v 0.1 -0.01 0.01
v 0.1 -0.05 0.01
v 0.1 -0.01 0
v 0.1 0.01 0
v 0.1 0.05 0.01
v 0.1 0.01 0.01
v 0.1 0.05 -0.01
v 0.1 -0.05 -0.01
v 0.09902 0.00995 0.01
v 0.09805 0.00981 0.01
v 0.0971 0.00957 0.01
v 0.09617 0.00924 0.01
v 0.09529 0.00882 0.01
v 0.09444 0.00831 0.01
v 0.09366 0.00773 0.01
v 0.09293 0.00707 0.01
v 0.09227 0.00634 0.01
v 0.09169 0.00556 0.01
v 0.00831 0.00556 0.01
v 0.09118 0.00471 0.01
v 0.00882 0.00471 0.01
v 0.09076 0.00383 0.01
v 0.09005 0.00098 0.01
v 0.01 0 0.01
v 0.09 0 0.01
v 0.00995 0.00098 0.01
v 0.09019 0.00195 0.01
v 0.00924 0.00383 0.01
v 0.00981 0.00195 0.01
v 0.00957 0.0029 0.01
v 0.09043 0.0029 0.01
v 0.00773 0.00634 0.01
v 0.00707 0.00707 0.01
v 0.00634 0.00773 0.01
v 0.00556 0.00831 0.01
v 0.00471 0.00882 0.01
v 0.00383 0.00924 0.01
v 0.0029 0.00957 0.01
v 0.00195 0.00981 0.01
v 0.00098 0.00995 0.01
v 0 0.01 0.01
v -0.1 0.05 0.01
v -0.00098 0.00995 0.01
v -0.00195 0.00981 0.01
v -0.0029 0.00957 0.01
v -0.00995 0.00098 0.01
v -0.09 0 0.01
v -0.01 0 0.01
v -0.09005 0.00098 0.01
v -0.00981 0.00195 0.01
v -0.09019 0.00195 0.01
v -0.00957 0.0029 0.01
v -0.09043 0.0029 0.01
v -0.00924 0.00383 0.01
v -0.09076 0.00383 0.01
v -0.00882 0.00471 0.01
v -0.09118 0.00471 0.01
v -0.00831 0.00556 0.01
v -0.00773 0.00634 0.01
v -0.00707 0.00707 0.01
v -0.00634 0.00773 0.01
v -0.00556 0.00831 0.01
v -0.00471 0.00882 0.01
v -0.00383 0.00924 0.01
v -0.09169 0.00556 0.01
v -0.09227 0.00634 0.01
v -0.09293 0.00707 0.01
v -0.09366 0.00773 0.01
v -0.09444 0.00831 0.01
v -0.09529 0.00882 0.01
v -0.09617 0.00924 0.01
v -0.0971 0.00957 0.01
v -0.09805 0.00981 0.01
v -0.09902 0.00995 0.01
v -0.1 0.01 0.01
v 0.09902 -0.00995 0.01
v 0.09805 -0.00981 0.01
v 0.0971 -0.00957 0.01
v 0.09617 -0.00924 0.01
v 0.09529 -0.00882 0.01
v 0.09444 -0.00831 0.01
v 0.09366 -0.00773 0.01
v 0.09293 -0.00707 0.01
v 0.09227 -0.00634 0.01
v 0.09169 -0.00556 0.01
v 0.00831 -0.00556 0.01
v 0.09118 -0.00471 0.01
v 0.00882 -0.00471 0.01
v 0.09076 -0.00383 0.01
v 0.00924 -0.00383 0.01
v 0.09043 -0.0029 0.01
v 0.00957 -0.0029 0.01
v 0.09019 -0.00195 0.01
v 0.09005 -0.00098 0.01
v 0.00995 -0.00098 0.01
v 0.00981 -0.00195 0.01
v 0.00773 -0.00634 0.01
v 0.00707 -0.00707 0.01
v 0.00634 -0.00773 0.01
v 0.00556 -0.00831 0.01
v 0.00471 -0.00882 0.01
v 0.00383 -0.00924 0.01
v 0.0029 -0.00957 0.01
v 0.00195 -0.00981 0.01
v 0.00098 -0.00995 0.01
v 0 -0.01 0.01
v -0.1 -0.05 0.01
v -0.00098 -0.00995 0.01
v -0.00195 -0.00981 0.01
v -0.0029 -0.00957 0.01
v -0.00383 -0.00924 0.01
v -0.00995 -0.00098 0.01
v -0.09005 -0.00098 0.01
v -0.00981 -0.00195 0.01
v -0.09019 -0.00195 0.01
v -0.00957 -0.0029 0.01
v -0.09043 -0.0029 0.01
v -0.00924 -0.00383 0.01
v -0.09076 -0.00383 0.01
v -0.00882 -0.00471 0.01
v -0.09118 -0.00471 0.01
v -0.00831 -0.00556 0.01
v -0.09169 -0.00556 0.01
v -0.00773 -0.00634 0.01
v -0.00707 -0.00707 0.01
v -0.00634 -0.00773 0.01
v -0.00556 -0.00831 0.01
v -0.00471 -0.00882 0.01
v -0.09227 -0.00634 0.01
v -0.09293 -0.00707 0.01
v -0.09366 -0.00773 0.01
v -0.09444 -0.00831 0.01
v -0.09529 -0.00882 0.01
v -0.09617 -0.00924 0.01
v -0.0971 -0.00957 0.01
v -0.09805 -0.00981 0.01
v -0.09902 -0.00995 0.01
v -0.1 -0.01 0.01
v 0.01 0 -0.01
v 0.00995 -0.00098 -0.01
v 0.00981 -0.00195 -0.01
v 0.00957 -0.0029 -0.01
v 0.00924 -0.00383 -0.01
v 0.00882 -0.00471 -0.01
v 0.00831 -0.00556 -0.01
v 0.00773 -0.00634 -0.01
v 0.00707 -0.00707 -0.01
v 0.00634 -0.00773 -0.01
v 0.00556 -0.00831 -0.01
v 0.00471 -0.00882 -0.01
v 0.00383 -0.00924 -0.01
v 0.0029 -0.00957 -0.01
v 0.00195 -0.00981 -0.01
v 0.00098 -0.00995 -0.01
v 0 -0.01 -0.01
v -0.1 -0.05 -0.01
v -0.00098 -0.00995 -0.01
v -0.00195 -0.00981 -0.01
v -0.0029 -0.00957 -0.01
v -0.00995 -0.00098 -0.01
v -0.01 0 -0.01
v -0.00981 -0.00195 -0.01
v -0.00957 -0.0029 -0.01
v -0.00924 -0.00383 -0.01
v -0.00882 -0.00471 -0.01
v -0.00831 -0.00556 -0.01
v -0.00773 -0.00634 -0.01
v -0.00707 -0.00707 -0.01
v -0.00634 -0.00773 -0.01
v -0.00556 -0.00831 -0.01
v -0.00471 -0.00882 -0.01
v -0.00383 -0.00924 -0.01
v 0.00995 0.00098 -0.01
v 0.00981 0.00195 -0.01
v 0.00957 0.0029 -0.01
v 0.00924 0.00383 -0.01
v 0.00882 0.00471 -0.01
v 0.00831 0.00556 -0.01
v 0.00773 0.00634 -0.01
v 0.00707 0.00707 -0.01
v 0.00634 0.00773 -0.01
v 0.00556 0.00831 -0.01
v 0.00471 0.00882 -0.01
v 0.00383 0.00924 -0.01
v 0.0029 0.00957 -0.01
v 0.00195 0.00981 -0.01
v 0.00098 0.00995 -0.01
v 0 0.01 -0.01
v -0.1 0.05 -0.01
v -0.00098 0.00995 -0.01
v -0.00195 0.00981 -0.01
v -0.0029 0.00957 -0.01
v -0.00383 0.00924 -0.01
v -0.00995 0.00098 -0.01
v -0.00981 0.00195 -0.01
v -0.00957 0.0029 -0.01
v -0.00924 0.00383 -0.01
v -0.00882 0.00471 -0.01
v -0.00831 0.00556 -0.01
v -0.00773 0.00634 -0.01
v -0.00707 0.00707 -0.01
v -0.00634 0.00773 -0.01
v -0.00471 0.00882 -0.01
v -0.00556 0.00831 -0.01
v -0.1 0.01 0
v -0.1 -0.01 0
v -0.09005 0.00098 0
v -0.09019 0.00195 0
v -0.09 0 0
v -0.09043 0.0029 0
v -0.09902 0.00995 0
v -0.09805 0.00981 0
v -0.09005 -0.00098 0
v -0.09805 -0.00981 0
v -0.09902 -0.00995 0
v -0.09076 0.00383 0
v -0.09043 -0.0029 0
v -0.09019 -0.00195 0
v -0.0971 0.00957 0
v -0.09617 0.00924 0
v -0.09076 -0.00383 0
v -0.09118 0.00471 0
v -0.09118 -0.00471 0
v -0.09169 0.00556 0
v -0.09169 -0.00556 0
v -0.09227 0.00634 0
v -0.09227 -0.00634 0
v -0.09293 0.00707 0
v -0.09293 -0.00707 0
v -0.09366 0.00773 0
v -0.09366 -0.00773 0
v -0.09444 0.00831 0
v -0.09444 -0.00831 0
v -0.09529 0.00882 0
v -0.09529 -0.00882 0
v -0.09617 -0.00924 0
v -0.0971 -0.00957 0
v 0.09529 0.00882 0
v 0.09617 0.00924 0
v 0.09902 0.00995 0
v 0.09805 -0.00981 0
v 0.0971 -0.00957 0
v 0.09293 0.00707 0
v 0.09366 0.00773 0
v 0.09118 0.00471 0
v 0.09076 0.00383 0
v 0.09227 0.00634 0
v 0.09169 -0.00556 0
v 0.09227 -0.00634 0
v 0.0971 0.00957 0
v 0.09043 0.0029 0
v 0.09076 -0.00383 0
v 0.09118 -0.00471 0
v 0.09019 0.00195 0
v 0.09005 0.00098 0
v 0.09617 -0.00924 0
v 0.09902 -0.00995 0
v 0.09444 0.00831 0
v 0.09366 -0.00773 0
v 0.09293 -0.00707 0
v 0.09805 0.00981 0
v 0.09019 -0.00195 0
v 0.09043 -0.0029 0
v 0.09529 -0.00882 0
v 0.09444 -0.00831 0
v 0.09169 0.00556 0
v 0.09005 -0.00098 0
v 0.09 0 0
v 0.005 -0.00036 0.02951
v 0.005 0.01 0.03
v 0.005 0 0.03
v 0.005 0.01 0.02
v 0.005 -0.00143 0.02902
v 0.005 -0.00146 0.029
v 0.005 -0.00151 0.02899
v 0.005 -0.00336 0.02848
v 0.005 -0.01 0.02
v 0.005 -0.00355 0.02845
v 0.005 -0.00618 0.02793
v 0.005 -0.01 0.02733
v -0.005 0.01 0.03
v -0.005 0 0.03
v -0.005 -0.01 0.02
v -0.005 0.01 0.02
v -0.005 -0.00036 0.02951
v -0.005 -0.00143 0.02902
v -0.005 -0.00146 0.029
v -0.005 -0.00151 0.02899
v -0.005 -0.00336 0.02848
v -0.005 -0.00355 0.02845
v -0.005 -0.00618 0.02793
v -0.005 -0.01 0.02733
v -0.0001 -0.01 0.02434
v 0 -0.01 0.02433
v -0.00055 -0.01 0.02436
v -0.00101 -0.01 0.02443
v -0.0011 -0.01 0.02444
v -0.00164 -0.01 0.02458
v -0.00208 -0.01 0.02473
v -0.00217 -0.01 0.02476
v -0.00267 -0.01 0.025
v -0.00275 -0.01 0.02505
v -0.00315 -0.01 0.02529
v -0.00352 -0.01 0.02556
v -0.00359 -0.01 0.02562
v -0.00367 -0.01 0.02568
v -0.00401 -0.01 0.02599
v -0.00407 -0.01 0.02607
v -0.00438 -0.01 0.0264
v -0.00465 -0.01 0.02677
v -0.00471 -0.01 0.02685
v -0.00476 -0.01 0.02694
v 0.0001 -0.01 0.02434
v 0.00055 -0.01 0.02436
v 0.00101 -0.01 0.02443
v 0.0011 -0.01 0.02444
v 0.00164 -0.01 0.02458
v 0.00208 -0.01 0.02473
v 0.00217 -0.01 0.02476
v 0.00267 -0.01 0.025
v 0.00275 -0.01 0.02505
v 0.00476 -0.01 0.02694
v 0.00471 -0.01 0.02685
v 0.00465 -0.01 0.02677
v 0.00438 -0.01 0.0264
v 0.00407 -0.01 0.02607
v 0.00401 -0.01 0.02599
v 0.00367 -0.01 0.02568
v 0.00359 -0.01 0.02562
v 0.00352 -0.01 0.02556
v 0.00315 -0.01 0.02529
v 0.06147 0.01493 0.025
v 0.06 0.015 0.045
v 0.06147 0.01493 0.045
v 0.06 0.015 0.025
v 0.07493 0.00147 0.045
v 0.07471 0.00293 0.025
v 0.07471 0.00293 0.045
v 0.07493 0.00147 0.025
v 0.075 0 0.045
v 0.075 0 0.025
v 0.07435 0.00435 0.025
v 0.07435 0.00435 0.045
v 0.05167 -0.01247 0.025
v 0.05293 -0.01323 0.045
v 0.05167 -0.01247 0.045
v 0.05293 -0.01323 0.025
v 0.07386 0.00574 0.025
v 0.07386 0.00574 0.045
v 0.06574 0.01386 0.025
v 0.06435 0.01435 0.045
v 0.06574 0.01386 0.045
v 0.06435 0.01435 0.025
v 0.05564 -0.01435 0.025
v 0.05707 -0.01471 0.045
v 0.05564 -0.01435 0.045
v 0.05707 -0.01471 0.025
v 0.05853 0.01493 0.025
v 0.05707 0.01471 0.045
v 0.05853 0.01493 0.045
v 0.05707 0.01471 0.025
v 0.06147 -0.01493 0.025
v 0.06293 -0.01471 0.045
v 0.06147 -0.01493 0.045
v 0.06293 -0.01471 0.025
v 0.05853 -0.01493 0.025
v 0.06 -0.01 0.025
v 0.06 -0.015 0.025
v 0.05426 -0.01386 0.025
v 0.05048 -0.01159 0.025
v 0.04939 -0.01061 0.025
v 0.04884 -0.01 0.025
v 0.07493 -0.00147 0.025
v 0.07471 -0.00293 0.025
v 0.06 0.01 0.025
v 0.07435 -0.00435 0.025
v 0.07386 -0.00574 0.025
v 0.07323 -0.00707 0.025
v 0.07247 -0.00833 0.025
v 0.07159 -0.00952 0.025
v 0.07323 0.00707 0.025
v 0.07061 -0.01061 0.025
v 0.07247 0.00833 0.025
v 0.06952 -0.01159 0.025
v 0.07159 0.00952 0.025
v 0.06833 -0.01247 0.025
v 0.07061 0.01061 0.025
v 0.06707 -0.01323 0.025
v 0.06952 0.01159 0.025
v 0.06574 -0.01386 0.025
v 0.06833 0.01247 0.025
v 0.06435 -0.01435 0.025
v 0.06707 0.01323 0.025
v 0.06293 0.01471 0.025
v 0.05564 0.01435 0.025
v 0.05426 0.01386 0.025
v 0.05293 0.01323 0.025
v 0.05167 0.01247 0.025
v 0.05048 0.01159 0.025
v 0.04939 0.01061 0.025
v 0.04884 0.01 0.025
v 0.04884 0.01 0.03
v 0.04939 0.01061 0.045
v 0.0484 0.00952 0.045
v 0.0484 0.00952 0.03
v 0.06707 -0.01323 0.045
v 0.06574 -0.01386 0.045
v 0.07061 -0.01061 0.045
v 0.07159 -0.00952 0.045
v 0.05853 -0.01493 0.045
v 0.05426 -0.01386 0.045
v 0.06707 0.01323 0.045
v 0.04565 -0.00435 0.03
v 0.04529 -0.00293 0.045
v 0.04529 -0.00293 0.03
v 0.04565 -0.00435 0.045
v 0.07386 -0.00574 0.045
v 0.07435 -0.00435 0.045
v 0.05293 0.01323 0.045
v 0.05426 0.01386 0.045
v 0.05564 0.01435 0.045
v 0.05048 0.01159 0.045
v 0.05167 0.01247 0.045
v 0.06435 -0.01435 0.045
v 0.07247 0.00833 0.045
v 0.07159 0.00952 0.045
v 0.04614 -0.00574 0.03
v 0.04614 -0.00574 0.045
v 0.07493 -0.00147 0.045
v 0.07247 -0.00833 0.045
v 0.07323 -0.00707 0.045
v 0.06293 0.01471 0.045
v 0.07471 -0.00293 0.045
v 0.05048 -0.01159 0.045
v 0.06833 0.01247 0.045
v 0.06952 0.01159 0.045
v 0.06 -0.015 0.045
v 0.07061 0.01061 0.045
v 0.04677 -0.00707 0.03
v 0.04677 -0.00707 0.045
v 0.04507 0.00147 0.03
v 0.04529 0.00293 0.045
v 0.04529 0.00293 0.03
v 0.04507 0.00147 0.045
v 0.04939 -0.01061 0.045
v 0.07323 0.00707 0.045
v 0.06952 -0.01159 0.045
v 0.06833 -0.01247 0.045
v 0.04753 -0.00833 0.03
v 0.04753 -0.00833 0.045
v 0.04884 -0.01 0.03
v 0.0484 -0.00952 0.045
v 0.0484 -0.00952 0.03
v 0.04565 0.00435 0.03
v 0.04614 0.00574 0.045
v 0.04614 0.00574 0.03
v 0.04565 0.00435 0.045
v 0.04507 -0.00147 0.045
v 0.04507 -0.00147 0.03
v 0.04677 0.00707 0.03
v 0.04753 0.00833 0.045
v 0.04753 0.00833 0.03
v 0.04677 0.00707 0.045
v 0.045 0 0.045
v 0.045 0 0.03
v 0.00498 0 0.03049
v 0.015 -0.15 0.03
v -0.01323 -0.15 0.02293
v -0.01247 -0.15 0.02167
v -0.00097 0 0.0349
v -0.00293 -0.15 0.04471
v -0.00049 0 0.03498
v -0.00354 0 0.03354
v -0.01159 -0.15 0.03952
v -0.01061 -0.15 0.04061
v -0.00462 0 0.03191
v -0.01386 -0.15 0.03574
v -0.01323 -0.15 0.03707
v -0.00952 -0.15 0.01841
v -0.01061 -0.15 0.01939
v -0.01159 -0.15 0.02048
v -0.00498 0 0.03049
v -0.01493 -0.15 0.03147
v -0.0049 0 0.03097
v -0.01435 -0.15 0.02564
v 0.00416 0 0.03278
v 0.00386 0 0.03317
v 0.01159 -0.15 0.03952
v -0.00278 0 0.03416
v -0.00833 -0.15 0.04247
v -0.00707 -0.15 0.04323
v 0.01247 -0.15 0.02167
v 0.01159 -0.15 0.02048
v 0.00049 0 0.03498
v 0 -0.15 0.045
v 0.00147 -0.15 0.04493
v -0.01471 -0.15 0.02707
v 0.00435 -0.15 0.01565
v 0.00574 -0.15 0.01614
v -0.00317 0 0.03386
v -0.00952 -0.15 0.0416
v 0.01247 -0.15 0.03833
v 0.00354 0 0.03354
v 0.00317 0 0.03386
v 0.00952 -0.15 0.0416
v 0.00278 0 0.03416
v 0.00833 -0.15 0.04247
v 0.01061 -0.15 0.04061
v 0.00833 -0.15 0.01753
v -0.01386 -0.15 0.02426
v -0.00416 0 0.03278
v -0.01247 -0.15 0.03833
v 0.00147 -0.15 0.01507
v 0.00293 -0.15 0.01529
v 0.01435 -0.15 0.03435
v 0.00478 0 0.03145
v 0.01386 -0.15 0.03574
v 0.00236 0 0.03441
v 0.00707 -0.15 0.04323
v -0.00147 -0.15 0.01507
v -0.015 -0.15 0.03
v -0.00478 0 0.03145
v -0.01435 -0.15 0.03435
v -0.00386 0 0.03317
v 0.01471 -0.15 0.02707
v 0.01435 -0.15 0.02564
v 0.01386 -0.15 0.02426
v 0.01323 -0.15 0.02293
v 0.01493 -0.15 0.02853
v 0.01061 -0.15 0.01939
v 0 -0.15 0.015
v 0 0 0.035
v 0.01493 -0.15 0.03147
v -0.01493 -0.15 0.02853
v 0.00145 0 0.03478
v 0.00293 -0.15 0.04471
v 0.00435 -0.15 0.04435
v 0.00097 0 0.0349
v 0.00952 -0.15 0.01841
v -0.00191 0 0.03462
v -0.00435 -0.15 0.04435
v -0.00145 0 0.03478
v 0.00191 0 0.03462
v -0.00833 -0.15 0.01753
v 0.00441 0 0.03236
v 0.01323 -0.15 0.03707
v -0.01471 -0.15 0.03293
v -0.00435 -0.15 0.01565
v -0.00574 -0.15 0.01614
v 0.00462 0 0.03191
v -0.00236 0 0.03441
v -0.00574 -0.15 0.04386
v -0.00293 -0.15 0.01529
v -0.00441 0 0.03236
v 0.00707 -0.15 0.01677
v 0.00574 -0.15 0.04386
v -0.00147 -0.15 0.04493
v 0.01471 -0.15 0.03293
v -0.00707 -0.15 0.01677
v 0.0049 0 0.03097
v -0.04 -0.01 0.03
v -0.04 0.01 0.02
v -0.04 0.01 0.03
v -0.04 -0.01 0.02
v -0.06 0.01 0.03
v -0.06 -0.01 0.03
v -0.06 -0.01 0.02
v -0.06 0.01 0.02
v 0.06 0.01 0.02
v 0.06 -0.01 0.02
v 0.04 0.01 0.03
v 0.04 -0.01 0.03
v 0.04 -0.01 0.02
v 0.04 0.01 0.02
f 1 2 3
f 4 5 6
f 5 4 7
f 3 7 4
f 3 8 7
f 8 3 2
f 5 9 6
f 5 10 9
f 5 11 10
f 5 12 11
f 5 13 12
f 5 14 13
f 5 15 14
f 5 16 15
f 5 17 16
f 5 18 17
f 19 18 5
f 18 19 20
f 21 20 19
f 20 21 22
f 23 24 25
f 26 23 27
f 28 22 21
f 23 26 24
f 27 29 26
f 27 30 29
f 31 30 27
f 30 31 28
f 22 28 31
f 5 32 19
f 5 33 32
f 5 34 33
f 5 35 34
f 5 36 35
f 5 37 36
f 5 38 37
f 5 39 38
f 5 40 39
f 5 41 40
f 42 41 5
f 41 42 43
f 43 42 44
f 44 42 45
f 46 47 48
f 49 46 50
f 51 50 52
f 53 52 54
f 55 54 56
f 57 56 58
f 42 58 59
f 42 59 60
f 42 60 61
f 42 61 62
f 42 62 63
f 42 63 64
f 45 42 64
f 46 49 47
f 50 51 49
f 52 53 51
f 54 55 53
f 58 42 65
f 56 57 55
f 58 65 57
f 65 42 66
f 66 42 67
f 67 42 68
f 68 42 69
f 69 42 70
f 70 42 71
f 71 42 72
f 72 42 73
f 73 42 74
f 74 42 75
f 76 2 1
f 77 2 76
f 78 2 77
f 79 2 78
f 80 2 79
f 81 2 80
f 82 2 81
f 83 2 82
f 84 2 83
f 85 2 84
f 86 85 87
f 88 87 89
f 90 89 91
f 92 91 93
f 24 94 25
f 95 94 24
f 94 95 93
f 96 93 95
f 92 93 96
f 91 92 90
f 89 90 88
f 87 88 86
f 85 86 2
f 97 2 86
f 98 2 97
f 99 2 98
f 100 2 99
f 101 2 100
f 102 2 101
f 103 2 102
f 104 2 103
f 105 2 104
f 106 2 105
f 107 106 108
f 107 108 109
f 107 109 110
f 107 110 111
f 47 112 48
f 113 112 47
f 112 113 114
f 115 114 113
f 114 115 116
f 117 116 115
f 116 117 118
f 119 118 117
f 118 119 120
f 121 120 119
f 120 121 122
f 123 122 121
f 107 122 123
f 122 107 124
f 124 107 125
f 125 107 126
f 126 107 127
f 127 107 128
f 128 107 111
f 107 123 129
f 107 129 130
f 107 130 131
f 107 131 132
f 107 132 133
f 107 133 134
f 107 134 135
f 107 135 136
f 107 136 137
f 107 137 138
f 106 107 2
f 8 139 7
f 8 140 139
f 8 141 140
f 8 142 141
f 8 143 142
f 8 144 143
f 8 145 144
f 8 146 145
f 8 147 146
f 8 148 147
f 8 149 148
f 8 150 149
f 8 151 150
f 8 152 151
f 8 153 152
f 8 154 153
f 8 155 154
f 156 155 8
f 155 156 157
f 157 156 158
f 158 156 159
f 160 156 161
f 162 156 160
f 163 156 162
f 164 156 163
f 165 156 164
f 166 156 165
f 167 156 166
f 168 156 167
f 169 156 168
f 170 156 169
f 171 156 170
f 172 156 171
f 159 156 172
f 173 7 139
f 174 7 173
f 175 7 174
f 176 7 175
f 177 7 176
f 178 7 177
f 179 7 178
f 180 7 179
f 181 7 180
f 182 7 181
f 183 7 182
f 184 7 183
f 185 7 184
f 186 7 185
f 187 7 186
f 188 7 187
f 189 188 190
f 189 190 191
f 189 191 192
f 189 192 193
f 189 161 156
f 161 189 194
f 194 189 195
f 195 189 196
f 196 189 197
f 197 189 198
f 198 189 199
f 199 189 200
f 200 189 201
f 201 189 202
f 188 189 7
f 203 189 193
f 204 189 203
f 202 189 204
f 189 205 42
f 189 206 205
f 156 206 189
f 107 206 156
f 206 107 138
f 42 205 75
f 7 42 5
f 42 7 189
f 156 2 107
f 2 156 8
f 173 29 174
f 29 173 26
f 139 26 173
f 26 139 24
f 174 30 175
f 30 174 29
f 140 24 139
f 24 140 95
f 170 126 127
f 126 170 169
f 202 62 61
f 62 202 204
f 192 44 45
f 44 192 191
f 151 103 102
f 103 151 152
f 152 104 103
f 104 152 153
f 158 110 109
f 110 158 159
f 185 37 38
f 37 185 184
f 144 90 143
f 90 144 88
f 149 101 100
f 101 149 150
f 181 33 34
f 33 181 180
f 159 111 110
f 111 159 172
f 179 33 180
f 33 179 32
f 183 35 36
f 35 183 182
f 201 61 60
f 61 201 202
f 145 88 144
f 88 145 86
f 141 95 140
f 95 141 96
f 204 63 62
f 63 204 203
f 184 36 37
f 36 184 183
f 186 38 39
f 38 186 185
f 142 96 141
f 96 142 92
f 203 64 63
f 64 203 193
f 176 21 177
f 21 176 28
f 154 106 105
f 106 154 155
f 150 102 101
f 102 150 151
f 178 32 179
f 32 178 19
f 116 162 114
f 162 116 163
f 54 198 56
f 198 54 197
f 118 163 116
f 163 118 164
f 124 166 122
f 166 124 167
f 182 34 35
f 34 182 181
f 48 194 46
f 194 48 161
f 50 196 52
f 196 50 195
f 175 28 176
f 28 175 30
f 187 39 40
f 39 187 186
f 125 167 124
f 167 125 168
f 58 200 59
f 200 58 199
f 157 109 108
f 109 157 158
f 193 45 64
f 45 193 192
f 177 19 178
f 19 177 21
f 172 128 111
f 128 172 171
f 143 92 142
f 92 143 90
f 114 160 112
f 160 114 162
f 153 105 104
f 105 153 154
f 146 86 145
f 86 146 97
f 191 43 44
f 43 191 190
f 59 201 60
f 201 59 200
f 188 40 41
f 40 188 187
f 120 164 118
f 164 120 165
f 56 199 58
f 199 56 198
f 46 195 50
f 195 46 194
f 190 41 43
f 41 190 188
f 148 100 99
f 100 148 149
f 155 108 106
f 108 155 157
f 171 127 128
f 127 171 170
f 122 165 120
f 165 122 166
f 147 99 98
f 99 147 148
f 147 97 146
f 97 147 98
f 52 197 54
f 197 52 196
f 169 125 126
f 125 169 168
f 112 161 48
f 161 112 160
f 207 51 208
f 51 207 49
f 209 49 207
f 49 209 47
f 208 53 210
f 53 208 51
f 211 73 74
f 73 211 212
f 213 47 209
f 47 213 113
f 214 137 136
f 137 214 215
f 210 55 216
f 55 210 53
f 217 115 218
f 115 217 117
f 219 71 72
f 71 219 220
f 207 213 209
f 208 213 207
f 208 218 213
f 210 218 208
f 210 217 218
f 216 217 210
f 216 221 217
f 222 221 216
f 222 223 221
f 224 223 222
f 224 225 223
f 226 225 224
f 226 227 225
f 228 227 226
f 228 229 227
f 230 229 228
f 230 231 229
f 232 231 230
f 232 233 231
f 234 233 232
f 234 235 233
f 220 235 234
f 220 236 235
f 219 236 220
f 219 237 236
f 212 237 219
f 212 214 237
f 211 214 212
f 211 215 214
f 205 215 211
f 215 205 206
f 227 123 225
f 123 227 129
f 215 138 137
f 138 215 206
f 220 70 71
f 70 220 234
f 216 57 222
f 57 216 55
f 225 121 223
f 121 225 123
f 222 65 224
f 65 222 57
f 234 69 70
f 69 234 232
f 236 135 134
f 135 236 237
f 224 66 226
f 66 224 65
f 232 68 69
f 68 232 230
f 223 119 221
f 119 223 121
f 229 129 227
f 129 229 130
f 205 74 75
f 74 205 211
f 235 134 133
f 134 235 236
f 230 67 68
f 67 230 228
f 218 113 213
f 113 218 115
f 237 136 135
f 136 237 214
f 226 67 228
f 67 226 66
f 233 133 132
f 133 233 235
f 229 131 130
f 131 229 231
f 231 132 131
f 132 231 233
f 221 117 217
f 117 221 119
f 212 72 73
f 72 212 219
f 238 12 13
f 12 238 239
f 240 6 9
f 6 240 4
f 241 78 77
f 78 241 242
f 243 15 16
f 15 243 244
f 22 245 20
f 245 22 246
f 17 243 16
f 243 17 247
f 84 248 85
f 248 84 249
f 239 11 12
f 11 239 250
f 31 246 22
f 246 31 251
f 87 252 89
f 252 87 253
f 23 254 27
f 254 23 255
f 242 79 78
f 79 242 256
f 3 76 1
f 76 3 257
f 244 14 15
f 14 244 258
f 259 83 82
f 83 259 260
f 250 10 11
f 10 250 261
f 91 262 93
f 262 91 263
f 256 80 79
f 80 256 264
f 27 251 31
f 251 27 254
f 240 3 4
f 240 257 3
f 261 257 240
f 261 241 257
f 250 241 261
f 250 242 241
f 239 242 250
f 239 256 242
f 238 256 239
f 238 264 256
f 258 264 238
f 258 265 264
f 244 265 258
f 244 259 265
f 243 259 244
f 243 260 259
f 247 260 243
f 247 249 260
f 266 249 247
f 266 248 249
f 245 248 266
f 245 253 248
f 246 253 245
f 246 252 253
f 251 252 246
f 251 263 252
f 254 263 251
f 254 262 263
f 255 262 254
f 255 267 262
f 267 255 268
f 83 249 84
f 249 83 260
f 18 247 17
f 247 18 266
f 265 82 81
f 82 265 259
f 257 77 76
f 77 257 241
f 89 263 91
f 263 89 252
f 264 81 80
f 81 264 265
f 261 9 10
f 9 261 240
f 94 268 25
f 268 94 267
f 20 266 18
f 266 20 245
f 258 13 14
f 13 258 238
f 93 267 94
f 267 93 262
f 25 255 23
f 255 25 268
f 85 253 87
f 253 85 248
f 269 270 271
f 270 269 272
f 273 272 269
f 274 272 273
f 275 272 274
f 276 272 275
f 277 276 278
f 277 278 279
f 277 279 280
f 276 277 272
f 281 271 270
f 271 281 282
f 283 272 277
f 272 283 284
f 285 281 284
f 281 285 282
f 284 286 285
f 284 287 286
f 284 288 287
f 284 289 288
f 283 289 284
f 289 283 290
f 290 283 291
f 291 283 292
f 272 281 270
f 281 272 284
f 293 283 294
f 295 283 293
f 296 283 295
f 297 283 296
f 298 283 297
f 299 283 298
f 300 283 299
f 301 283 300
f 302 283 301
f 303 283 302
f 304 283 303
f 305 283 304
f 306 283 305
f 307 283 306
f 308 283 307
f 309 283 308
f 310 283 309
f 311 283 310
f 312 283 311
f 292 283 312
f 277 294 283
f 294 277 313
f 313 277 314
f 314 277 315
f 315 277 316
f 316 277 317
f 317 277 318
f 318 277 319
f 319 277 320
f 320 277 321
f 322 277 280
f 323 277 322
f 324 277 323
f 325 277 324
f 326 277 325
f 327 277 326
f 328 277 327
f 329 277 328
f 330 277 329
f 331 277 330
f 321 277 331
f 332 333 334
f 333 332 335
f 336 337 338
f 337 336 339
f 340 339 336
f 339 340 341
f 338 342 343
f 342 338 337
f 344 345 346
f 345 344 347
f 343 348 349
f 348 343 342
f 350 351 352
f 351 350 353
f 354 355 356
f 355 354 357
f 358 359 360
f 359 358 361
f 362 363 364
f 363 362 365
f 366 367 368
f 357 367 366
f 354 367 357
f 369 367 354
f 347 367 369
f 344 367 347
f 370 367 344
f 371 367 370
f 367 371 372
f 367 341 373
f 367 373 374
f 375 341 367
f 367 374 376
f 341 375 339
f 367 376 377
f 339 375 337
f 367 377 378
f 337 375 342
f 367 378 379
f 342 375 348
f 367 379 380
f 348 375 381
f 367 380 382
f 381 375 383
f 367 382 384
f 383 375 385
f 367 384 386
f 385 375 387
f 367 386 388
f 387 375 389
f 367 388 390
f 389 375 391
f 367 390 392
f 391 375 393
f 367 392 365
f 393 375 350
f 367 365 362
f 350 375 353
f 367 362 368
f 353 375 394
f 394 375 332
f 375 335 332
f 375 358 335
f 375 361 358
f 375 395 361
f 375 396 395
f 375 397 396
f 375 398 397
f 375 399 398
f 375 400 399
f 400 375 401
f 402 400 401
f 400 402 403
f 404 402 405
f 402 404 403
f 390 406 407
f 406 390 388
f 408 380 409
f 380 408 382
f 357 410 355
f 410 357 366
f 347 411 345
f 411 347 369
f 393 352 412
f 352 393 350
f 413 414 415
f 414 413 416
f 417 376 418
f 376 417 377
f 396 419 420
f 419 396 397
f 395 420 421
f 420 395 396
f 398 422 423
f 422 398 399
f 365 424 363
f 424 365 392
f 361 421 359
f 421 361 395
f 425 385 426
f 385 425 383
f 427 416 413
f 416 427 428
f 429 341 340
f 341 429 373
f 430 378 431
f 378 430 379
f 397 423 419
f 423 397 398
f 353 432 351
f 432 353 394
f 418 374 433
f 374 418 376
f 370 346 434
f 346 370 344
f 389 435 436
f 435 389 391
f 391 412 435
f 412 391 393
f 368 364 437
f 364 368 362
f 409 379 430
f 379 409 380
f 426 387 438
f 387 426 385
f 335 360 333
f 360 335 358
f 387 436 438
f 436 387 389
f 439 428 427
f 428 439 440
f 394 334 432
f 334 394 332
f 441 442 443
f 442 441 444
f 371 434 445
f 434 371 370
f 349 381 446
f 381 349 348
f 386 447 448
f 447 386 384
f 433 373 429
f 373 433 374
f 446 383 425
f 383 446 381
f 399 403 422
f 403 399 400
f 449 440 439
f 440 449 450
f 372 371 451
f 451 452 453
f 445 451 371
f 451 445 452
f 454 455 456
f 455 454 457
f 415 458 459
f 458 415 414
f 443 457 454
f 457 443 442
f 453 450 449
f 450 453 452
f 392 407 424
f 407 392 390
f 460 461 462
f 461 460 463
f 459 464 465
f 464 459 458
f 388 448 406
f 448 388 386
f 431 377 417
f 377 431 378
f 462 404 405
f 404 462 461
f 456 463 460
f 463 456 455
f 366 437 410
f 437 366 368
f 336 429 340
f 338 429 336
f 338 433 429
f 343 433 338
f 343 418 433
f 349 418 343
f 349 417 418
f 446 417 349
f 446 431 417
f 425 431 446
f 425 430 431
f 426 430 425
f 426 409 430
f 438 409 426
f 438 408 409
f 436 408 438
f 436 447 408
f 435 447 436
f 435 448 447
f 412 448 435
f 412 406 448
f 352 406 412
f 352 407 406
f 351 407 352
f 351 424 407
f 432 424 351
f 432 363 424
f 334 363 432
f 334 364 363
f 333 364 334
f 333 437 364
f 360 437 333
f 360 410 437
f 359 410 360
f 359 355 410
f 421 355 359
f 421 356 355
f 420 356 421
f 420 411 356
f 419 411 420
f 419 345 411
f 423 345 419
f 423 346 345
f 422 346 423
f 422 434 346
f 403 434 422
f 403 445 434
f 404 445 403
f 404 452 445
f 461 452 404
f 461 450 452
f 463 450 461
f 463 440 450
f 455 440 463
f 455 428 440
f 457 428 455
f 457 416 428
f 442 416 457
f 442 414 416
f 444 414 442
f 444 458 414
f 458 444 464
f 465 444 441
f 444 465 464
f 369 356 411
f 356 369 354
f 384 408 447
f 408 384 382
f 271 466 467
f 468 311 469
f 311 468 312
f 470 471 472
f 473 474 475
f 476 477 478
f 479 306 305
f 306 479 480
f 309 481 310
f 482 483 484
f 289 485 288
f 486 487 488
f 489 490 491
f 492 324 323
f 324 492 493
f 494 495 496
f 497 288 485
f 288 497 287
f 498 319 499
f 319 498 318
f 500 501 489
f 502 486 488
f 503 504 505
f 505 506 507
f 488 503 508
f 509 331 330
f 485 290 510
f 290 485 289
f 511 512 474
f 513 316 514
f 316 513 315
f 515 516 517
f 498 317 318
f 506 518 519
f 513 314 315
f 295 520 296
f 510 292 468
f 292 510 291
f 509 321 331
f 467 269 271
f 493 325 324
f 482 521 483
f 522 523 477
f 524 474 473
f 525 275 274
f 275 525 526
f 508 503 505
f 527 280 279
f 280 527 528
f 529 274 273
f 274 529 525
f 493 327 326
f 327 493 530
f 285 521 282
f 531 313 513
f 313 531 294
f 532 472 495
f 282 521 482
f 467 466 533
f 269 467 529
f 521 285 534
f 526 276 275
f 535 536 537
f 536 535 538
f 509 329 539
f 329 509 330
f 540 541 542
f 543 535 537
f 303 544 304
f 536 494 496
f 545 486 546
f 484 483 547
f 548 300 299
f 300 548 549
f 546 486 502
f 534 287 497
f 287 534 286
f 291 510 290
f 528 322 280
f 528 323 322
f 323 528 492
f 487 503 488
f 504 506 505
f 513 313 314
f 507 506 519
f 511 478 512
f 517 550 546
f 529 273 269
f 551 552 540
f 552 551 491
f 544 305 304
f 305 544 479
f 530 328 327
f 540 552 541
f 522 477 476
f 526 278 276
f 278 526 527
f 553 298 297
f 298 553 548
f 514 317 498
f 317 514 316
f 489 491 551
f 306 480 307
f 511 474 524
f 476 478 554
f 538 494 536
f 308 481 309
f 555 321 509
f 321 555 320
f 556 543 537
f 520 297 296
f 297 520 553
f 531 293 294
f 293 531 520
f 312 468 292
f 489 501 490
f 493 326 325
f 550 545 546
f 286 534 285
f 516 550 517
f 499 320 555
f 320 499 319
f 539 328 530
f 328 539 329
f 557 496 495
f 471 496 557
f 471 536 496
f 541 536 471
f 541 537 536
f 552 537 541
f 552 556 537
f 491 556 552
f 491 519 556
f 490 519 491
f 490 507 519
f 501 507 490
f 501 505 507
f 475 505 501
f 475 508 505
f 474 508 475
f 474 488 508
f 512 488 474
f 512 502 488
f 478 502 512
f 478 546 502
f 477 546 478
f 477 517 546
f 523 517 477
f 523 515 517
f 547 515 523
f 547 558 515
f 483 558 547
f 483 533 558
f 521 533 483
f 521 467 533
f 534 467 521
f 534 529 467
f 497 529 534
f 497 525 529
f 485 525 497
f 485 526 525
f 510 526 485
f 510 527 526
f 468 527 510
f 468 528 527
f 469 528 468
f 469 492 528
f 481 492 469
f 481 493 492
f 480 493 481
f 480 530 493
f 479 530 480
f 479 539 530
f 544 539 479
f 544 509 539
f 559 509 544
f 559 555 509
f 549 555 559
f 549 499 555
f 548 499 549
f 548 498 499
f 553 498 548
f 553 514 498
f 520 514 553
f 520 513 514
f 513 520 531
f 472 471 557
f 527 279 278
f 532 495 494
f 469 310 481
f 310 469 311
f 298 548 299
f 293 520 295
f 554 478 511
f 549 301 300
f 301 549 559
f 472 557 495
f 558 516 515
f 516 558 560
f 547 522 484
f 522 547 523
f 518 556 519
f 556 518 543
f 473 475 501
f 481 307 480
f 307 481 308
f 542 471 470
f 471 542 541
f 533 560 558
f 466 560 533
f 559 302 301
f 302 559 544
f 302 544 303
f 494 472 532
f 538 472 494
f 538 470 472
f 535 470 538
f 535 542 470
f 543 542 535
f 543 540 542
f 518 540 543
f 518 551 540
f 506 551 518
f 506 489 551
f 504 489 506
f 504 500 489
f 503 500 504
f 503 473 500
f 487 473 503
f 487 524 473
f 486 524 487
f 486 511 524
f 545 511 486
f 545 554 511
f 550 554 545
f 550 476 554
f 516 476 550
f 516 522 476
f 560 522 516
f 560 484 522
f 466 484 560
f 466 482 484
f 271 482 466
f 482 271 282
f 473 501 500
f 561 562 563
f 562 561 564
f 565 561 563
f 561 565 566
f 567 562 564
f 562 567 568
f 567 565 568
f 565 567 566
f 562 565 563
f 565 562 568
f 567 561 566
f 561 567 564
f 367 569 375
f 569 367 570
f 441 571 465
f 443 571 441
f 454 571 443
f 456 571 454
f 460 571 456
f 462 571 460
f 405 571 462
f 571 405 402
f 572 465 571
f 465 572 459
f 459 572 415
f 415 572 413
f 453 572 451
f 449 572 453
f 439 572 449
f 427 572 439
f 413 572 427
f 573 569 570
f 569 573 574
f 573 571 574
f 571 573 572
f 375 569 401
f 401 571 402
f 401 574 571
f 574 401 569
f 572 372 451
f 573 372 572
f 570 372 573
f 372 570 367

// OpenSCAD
module rounded_rectangle_base(length, width, height, radius) {
    difference() {
        cube([length, width, height], center = true);
        translate([0, 0, -height/2])
            cylinder(h = height, r = radius, $fn = 64);
        translate([0, 0, height/2])
            cylinder(h = height, r = radius, $fn = 64);
        translate([-length/2, 0, 0])
            cylinder(h = height, r = radius, $fn = 64);
        translate([length/2, 0, 0])
            cylinder(h = height, r = radius, $fn = 64);
    }
}

module arm_with_rounded_end(length, width, height, neck_width, neck_height, end_radius) {
    union() {
        translate([0, 0, neck_height/2])
            cube([neck_width, width, neck_height], center = true);
        translate([length/2 - end_radius, 0, neck_height/2])
            cylinder(h = width, r = end_radius, $fn = 64);
        translate([0, 0, neck_height])
            rotate([90, 0, 0])
                cylinder(h = length, r1 = neck_width/2, r2 = end_radius, $fn = 64);
    }
}

module side_bosses(boss_width, boss_height, boss_depth) {
    translate([0, 0, boss_height/2])
        cube([boss_width, boss_depth, boss_height], center = true);
}

module mounting_bracket() {
    union() {
        rounded_rectangle_base(0.2, 0.1, 0.02, 0.01);
        translate([0, 0, 0.02])
            arm_with_rounded_end(0.15, 0.02, 0.02, 0.01, 0.01, 0.015);
        translate([-0.05, 0, 0.02])
            side_bosses(0.02, 0.01, 0.02);
        translate([0.05, 0, 0.02])
            side_bosses(0.02, 0.01, 0.02);
    }
}

mounting_bracket();
